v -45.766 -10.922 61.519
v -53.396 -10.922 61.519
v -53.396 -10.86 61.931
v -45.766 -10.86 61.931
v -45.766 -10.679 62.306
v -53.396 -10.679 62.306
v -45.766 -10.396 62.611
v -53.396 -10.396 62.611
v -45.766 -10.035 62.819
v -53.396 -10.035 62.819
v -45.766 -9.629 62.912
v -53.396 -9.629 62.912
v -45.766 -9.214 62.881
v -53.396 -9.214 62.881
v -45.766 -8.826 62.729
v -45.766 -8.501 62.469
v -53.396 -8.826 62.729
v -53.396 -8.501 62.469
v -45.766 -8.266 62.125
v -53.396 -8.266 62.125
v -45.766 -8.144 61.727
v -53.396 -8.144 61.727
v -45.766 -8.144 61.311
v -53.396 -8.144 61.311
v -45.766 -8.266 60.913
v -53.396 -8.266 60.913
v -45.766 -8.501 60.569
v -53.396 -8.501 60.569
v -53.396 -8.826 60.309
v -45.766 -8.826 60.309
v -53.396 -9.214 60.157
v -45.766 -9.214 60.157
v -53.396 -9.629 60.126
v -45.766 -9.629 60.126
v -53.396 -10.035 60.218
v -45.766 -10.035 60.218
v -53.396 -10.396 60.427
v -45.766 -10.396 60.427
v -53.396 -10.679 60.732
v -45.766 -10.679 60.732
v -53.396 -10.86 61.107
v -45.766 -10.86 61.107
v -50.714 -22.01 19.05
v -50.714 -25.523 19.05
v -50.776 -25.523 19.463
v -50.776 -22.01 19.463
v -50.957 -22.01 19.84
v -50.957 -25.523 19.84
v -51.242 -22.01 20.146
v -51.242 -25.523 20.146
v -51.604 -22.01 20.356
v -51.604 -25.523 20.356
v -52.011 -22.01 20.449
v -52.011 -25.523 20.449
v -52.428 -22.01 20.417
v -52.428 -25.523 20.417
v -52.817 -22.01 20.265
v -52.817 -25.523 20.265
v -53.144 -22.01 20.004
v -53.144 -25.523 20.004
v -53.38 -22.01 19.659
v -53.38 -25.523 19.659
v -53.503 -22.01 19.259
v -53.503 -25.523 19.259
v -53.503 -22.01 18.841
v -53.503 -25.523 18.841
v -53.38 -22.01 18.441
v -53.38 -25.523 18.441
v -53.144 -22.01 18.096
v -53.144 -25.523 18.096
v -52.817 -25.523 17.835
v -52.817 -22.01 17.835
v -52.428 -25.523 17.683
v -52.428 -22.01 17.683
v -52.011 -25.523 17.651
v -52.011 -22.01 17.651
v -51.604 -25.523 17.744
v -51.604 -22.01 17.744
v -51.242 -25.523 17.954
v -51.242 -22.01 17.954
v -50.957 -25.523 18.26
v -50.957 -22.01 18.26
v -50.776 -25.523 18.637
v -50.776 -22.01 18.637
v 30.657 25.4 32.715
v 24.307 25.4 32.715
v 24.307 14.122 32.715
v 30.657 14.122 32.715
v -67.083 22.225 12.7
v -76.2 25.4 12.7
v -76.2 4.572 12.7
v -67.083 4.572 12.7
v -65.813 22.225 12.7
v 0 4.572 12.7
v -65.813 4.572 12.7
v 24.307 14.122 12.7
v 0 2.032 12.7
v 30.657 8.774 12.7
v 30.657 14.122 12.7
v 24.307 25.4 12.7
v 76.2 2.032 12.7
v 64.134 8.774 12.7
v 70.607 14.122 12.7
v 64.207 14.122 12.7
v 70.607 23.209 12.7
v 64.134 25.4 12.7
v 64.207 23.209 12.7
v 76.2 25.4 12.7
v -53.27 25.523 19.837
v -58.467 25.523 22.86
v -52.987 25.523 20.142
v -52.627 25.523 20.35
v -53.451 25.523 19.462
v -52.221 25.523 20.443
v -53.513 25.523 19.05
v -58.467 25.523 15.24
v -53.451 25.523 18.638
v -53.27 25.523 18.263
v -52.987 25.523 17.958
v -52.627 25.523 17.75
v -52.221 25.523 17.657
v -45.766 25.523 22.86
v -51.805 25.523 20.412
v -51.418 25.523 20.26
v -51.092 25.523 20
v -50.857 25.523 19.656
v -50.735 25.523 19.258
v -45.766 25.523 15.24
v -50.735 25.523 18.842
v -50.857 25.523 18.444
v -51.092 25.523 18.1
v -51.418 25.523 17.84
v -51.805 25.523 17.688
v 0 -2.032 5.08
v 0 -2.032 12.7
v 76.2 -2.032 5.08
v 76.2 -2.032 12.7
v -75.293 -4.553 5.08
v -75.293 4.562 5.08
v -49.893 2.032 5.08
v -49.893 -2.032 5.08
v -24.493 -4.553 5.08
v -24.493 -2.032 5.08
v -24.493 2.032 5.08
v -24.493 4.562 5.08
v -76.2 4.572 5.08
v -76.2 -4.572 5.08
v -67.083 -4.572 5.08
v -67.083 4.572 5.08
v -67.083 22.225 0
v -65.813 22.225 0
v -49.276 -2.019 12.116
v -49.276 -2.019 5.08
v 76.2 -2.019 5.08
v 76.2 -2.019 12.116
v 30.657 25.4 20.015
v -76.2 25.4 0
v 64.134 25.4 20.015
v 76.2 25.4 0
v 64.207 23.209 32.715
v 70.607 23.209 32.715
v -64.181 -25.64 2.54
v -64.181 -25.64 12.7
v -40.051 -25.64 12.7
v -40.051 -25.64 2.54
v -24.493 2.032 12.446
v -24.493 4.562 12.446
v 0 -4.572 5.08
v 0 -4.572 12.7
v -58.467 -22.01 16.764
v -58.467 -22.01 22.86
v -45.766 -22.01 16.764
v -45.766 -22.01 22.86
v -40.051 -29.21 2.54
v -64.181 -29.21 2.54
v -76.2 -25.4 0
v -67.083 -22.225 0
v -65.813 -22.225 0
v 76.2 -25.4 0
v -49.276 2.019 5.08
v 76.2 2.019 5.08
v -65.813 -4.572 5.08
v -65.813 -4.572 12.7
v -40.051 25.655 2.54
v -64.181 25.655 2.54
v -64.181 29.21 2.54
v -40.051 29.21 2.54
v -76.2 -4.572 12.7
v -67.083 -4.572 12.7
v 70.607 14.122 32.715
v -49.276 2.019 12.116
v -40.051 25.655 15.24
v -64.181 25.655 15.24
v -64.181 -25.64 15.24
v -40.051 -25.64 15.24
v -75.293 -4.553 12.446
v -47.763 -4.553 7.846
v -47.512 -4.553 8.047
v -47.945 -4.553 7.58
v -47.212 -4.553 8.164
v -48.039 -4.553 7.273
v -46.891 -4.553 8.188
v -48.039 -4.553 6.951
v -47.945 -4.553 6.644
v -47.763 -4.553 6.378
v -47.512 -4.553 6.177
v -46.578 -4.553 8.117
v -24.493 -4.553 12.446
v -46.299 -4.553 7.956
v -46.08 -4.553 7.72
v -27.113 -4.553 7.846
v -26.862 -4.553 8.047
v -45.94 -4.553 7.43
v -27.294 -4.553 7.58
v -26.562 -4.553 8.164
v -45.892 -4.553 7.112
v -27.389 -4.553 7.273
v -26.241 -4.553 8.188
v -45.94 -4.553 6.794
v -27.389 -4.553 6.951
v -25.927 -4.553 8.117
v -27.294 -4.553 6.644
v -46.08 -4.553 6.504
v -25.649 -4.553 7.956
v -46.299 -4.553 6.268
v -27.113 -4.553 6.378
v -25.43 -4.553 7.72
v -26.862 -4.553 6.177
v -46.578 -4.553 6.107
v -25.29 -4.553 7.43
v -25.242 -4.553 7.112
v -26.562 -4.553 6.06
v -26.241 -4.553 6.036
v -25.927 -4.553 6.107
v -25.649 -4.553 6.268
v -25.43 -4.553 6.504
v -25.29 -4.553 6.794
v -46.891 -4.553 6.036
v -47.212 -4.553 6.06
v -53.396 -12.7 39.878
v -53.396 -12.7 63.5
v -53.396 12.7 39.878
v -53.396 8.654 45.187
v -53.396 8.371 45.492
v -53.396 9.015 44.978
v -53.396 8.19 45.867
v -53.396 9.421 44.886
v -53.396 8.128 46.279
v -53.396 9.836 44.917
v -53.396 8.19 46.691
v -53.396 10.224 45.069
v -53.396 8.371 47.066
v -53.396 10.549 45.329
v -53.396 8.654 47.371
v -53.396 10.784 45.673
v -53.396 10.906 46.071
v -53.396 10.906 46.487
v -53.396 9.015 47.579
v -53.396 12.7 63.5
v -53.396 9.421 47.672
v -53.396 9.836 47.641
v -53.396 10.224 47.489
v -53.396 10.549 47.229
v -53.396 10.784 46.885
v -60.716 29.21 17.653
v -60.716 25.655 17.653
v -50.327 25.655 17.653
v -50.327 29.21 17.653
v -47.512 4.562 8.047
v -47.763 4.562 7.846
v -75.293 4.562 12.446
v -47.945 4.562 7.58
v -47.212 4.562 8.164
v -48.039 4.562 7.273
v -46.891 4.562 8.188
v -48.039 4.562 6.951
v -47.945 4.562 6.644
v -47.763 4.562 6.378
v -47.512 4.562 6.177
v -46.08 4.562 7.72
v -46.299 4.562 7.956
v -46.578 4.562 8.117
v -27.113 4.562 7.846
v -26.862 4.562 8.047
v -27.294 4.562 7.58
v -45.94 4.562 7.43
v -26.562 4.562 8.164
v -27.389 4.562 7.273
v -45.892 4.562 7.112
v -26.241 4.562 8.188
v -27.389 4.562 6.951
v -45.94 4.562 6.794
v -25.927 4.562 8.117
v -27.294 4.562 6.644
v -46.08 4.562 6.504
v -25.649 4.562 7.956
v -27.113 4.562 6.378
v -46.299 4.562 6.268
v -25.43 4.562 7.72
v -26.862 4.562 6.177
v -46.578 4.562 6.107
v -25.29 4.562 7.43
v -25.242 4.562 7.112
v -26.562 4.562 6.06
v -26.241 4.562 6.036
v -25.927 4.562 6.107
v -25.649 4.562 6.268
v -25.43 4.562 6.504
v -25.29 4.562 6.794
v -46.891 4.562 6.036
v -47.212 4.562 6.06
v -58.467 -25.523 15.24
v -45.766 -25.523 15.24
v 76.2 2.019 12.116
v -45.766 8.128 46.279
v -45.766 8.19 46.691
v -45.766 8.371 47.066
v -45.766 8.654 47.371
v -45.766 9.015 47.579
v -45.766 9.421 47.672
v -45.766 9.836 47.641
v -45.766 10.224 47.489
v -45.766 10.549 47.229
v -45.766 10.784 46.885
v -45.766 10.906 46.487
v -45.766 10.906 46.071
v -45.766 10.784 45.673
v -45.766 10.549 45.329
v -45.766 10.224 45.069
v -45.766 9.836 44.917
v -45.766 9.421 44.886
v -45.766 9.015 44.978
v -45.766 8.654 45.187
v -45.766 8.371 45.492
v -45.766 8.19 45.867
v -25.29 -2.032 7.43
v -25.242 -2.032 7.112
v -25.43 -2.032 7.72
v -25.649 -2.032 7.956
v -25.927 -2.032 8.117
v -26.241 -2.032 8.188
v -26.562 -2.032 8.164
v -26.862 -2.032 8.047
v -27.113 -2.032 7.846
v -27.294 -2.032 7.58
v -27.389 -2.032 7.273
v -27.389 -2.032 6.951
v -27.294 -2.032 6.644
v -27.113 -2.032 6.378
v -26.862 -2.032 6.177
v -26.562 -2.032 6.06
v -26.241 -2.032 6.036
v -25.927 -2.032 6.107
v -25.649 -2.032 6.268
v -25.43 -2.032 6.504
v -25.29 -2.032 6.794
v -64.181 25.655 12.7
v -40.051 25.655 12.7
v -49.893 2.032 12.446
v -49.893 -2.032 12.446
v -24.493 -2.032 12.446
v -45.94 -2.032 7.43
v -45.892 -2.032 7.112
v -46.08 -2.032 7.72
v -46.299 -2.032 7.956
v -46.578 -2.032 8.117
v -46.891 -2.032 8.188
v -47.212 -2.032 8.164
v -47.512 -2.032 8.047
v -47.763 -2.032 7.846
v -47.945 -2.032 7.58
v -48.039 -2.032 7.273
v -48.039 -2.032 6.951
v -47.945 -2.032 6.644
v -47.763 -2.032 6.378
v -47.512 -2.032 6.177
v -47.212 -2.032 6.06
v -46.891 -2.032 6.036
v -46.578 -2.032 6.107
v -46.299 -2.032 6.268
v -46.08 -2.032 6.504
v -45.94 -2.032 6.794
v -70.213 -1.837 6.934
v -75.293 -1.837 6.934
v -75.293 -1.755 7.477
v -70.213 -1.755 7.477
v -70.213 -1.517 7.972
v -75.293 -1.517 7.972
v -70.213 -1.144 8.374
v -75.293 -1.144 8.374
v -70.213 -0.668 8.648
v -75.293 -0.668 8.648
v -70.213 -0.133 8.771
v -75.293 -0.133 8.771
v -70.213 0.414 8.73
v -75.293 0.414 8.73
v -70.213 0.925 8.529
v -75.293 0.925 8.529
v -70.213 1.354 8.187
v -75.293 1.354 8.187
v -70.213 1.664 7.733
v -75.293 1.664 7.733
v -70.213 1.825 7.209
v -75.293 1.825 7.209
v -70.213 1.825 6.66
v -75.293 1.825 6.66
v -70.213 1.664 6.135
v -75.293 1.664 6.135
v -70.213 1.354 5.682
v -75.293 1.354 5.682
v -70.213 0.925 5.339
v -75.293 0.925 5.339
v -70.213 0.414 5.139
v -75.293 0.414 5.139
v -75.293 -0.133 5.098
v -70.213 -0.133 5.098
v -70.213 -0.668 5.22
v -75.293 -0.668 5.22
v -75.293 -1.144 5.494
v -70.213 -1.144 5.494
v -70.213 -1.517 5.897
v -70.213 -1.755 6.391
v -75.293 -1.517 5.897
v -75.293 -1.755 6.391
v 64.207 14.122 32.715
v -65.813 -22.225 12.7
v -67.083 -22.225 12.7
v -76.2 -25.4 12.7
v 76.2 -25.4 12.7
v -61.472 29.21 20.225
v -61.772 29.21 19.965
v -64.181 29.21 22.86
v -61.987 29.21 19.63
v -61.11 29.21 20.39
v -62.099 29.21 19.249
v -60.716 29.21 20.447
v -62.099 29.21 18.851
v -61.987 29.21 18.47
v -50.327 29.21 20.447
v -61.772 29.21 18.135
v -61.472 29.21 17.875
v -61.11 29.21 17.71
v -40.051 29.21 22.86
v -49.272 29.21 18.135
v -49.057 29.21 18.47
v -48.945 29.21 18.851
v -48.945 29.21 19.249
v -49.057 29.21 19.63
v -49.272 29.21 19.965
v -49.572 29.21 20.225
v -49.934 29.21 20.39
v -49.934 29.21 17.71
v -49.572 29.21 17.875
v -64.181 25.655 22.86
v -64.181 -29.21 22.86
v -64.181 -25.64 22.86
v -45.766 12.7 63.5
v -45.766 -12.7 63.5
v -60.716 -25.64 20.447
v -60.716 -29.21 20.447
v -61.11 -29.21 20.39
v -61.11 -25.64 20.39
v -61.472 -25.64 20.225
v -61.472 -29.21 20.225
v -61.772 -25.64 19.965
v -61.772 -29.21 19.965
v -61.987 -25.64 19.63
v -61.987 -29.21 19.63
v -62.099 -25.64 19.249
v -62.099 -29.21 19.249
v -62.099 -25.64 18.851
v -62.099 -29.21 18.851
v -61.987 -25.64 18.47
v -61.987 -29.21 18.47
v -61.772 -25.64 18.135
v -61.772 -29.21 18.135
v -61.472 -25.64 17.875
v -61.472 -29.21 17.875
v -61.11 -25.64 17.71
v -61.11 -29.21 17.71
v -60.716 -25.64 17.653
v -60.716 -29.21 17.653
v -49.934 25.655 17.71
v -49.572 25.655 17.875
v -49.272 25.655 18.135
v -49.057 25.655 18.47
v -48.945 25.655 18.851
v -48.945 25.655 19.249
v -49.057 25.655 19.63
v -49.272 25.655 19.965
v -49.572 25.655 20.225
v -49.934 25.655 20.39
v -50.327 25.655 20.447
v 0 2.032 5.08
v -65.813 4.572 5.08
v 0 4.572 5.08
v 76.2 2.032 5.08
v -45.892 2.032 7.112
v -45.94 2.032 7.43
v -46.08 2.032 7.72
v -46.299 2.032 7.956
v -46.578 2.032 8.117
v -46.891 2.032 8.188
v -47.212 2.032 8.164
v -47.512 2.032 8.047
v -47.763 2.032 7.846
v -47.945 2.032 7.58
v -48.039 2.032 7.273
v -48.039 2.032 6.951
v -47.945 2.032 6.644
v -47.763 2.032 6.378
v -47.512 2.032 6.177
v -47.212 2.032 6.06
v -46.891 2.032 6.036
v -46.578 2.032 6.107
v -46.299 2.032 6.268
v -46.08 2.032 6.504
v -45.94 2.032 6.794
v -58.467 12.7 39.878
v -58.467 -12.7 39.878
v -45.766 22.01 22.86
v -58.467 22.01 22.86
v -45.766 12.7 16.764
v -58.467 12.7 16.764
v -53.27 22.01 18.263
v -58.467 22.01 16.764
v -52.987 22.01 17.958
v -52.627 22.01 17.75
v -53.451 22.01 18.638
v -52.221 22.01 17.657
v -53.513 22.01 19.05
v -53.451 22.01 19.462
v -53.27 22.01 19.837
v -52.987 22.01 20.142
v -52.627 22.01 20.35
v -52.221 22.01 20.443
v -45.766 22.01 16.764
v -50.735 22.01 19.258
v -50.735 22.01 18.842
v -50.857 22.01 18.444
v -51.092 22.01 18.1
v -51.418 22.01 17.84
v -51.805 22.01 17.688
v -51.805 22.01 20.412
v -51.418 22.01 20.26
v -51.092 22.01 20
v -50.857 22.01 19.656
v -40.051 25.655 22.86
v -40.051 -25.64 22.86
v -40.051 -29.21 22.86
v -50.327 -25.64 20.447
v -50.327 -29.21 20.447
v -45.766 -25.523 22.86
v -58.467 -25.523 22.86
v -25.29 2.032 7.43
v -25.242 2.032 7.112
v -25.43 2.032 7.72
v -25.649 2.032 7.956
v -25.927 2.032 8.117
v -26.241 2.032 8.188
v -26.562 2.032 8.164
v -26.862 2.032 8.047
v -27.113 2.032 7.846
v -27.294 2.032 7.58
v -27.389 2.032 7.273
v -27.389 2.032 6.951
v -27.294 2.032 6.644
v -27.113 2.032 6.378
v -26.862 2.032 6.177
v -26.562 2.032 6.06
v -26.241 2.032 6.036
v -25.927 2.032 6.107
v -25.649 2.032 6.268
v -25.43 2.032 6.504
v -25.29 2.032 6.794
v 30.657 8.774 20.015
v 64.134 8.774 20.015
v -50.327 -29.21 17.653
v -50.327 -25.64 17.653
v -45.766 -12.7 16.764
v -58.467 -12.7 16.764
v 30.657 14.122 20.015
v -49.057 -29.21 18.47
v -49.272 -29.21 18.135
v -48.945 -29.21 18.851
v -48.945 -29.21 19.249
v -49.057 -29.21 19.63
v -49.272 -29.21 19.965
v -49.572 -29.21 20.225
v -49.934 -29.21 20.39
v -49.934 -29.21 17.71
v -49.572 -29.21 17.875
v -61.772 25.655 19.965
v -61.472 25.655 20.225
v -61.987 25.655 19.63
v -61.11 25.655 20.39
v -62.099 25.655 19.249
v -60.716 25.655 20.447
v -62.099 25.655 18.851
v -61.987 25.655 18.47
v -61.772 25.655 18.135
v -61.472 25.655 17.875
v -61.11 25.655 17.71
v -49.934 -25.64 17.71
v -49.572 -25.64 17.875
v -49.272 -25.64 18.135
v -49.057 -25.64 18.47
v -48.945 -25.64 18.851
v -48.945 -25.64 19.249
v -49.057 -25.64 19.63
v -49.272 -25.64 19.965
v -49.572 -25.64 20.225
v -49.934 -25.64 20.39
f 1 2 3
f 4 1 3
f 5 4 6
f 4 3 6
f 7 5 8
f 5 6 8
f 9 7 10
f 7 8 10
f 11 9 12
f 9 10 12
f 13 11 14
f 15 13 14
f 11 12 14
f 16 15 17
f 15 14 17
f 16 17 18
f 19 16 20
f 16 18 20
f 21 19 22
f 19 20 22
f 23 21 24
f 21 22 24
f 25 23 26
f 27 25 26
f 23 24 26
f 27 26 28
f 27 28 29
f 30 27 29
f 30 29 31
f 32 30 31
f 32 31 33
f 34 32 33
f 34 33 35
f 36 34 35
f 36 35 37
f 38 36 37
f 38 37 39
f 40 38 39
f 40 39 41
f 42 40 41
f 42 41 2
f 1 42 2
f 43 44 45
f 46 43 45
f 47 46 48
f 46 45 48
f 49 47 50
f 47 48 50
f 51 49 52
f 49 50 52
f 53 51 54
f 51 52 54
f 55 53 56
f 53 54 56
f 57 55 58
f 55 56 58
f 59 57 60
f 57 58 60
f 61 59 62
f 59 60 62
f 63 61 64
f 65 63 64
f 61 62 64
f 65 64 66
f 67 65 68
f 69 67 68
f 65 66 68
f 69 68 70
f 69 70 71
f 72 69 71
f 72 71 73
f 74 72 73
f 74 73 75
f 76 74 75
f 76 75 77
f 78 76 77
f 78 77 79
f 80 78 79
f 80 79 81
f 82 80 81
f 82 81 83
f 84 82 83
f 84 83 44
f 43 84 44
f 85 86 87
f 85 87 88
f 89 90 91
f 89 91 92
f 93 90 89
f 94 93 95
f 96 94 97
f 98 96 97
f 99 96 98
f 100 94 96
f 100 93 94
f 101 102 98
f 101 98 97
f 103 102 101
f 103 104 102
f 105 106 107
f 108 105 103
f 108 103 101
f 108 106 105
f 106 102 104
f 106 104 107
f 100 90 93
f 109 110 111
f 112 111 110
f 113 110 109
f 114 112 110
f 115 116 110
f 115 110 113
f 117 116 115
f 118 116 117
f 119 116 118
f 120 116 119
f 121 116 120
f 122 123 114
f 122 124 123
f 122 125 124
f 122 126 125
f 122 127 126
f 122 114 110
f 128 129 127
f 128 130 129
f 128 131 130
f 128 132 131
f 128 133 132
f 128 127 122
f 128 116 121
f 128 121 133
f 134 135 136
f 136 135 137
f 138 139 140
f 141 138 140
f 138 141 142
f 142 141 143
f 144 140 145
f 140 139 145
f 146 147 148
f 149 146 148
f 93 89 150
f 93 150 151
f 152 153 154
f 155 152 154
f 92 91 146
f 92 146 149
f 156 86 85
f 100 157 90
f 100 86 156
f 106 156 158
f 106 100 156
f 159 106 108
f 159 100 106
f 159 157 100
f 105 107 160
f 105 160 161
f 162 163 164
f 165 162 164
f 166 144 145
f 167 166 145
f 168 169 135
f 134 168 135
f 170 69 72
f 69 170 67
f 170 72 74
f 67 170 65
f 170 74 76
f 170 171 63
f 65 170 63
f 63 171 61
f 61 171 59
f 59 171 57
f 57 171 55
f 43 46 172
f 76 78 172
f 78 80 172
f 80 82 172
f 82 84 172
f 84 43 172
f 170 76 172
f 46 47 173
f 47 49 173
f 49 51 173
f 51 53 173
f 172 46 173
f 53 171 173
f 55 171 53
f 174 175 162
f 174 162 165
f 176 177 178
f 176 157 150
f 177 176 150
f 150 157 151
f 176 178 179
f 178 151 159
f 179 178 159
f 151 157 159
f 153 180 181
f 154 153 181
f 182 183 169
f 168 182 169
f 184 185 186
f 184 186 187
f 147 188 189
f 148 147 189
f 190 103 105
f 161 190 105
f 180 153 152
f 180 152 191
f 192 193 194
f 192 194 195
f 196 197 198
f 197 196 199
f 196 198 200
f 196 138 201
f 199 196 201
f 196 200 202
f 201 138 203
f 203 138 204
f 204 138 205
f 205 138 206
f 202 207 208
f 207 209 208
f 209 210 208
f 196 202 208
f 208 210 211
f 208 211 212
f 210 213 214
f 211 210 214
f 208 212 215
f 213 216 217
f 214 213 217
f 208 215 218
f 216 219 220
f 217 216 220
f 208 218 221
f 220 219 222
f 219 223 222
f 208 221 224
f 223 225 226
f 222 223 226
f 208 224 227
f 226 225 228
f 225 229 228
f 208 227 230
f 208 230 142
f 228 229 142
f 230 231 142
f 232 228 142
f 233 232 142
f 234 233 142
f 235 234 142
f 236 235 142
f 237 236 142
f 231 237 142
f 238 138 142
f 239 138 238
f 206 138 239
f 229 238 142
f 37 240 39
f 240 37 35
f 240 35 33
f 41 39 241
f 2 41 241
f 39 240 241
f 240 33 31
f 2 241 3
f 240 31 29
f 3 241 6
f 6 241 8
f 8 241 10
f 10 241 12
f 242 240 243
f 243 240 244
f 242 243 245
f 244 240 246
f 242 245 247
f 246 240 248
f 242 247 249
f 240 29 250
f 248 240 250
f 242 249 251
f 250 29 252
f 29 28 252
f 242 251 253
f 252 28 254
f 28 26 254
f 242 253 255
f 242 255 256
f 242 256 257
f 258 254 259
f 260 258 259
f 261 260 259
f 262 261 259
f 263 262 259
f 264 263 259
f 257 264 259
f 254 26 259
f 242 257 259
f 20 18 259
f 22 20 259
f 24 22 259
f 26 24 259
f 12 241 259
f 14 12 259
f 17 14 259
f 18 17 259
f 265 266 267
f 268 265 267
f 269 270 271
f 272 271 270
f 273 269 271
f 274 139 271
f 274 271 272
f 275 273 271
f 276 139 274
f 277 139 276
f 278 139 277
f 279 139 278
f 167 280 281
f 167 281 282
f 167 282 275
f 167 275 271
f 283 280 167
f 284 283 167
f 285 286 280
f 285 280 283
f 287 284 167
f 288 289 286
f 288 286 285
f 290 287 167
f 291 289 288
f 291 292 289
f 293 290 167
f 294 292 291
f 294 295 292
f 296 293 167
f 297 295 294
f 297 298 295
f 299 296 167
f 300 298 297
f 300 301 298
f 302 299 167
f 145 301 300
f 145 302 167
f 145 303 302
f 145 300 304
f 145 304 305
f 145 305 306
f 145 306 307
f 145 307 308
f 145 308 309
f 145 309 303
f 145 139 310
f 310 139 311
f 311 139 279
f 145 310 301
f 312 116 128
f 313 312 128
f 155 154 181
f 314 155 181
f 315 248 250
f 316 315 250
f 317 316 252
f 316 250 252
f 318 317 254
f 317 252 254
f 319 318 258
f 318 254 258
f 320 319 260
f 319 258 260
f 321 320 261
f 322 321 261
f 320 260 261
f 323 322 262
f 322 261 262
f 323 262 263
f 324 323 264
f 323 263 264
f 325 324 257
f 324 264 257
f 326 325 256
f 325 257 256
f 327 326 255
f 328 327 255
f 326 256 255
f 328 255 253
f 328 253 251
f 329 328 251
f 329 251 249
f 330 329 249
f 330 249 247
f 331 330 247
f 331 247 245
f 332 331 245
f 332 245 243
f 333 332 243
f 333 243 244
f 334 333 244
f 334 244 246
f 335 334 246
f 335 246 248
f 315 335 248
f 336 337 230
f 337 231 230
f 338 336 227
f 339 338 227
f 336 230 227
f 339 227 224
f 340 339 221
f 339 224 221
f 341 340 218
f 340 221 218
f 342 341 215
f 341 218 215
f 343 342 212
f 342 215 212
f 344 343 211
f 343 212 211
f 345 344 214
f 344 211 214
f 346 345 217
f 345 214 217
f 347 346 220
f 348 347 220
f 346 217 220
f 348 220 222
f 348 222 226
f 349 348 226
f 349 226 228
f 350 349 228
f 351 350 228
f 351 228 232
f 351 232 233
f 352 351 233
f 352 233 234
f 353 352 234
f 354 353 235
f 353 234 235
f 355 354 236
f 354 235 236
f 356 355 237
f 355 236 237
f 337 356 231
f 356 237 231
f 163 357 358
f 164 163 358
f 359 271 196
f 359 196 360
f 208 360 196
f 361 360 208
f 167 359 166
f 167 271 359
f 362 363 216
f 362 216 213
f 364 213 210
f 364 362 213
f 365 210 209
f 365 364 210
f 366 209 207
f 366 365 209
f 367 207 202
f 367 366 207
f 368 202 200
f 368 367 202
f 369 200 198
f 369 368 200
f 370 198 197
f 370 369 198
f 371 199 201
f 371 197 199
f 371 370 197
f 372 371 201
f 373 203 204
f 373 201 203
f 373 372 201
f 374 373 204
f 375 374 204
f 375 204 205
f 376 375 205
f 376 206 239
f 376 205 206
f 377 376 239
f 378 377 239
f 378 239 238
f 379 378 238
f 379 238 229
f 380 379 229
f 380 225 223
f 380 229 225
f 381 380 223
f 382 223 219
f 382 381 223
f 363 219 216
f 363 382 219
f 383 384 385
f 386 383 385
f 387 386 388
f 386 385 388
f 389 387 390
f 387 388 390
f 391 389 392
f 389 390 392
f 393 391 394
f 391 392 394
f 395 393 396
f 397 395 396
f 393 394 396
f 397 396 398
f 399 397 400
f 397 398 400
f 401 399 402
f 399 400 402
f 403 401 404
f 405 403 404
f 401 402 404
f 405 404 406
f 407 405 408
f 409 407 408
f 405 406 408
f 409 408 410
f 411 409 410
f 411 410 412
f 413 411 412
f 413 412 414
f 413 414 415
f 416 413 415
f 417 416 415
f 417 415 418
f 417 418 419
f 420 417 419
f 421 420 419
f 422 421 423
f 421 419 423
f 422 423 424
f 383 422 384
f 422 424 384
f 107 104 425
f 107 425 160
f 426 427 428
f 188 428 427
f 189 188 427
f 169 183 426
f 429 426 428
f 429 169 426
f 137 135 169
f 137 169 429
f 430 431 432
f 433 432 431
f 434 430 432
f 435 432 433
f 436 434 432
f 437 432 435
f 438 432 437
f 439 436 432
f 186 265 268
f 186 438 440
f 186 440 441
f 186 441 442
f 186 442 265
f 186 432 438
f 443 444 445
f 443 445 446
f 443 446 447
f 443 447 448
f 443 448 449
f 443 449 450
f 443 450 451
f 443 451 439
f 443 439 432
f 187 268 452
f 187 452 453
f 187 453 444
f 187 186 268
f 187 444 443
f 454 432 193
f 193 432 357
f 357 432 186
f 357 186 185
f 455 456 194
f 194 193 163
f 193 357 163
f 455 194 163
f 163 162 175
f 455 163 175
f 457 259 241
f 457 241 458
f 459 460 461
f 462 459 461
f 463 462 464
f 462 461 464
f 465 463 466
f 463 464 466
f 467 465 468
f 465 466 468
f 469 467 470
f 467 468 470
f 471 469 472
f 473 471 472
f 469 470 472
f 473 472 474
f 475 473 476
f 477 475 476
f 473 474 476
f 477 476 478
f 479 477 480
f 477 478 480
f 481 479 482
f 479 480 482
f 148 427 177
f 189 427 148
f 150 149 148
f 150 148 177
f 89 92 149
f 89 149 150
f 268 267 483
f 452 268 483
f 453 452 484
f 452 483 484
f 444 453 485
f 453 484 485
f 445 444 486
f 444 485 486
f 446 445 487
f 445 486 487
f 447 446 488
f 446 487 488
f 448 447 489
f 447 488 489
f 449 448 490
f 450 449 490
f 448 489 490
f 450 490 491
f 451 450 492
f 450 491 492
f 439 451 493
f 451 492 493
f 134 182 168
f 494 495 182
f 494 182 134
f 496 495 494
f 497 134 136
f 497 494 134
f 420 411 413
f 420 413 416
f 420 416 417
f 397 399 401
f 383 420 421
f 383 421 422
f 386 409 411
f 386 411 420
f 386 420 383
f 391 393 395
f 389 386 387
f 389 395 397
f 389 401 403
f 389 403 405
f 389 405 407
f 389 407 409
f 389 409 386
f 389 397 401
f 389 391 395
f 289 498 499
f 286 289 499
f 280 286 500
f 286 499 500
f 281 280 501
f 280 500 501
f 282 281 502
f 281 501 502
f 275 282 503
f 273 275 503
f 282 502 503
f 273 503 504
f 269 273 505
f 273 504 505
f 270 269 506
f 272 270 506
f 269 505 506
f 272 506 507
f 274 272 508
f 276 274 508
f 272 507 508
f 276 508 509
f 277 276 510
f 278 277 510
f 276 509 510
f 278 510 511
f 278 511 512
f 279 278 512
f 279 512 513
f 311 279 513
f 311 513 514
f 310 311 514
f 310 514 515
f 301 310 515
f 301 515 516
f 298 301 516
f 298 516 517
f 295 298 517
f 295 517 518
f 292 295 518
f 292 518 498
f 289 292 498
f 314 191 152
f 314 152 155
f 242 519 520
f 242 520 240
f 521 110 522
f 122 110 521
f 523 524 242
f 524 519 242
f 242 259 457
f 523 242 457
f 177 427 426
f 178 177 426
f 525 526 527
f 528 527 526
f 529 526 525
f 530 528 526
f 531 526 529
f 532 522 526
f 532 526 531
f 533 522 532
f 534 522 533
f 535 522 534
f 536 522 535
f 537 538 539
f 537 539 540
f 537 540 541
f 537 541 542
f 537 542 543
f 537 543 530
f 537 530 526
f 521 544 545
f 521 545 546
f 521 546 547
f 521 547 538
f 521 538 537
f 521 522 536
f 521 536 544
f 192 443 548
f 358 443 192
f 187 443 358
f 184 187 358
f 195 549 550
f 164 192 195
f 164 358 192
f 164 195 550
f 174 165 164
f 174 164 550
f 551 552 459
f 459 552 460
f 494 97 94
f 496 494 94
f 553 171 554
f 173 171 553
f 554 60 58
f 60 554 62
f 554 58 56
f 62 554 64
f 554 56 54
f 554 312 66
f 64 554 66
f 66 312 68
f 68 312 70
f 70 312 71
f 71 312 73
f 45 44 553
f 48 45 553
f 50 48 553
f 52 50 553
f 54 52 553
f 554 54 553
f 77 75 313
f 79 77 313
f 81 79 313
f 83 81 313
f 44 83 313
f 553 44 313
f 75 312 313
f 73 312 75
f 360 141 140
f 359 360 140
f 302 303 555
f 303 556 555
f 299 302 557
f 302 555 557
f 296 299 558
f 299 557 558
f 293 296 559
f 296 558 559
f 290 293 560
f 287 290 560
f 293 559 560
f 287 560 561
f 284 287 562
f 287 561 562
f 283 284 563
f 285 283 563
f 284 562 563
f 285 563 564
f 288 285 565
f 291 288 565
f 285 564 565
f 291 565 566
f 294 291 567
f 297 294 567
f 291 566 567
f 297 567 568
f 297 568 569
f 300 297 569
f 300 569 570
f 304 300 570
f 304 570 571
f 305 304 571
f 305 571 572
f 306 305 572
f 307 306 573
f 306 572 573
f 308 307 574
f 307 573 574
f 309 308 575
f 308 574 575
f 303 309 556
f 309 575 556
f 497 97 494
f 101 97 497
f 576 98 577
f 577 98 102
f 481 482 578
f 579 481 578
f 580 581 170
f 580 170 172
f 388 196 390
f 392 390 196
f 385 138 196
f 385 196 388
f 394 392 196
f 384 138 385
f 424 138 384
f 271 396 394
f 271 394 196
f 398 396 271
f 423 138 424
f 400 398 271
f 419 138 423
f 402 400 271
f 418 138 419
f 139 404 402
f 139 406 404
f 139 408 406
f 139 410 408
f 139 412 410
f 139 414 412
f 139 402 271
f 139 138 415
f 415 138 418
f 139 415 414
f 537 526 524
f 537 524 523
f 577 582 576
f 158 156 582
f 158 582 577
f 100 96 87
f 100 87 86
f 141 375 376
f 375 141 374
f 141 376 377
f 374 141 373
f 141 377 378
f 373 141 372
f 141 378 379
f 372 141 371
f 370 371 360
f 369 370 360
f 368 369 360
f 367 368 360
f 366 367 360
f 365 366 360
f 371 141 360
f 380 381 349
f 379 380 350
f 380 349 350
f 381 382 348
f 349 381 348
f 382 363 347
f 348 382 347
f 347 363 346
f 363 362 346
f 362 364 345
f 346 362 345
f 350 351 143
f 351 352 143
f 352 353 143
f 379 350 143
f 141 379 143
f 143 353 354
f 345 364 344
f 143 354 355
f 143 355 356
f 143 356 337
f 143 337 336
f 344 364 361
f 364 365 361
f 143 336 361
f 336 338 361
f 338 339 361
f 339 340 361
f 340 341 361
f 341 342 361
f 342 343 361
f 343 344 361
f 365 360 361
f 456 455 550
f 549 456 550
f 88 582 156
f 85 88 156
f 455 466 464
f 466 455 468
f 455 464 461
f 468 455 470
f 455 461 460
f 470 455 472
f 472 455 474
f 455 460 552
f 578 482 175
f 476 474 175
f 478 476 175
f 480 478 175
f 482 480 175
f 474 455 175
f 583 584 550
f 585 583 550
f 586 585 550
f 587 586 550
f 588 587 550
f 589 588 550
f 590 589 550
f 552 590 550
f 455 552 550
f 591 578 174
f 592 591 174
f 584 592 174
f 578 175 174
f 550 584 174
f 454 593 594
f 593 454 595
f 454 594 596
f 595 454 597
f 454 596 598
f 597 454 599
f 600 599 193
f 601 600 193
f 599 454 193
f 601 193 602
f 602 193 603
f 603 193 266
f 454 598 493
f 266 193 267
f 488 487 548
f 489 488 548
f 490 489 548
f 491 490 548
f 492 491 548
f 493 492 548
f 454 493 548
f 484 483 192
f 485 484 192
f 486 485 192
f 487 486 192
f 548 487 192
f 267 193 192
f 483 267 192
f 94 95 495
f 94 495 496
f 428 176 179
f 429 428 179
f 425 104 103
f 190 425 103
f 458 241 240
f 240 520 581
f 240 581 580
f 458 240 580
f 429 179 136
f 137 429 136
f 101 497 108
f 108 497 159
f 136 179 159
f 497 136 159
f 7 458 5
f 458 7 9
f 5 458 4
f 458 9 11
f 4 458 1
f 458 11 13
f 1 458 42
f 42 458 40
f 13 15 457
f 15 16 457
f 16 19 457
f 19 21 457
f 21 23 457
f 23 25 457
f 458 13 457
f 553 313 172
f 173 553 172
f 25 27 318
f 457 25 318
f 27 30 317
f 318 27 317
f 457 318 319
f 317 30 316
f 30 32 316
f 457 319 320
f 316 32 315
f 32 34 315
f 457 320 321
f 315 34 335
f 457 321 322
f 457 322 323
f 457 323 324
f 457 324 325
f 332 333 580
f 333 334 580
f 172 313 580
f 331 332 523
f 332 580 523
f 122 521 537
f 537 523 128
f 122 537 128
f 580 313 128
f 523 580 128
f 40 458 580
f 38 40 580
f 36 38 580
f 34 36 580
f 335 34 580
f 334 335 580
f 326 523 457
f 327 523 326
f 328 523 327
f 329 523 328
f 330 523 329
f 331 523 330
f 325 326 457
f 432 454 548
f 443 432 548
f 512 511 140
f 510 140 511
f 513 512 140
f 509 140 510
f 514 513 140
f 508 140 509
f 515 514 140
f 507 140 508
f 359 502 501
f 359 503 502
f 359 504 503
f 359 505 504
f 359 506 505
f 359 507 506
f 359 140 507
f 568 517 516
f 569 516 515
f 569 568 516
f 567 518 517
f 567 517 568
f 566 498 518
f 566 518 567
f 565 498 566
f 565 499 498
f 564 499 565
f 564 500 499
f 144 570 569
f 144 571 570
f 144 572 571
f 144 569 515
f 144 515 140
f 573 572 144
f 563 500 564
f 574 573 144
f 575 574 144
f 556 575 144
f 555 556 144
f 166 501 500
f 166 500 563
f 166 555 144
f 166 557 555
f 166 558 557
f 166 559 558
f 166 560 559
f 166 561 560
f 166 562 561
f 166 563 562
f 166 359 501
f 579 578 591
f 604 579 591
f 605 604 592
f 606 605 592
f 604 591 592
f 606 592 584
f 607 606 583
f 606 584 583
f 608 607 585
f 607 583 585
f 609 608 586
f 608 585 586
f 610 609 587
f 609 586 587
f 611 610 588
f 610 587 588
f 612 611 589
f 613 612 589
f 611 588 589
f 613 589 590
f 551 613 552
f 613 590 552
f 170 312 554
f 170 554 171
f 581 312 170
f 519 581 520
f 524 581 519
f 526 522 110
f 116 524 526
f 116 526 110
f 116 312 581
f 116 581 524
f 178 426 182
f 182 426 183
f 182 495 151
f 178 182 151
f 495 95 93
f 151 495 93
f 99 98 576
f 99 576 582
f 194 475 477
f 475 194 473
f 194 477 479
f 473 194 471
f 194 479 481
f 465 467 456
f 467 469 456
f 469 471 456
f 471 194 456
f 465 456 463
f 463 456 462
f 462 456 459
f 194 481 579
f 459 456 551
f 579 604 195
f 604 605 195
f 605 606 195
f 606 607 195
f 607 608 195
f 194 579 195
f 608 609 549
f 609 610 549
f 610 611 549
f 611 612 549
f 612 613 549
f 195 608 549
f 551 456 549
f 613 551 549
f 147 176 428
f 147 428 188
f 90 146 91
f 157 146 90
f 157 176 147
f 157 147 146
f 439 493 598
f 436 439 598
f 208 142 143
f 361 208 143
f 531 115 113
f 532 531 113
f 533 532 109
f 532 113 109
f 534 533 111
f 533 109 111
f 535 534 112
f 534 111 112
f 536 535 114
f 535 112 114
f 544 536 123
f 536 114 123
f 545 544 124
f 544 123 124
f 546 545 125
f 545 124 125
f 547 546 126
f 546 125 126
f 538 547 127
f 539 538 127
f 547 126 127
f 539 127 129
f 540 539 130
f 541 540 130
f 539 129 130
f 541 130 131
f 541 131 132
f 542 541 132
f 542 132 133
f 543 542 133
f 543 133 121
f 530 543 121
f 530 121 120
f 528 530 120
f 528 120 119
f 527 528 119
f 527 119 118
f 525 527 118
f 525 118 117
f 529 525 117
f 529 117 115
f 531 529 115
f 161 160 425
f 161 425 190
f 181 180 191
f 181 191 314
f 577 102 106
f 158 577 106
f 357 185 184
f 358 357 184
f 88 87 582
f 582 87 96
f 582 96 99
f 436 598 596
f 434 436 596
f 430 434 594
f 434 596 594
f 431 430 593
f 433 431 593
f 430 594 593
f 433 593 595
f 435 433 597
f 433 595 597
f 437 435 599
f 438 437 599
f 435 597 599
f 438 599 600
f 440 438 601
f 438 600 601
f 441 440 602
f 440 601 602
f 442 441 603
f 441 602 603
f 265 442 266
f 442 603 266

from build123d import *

# Parameters (mm, degrees)
F0_W      = 152.4
F0_H      = 50.8
F1_DEPTH  = 12.7
F2_W      = 152.4
F2_H      = 4.064
F3_DEPTH  = 7.62
F4_W      = 125.476
F4_H      = 4.0386
F5_DEPTH  = 7.0358
F6_W      = 76.2
F6_H      = 9.144
F7_DEPTH  = 7.62
F8_W      = 50.8
F8_H      = 9.1151185334
F9_DEPTH  = 7.366
F10_W     = 1.27
F10_H     = 44.45
F11_DEPTH = 25.4
F12_W     = 6.35
F12_H     = 11.2776
F12_W_2   = 6.4000114799
F12_H_2   = 9.0863150216
F13_DEPTH = 20.0152
F14_W     = 33.4765905678
F14_H     = 16.6260491401
F15_DEPTH = 7.3152
F16_W     = 25.4
F16_H     = 4.064
F17_DEPTH = 25.4
F18_R     = 1.8415
F19_DEPTH = 5.08
F20_R     = 1.0795
F21_DEPTH = 25.4
F22_W     = 24.13
F22_H     = 58.42
F23_DEPTH = 2.54
F24_W     = 24.13
F24_H     = 3.5704082614
F24_H_2   = 3.5550768292
F25_DEPTH = 10.16
F27_DEPTH = 140.208
F28_W     = 12.7008110285
F28_H     = 51.0461516678
F29_DEPTH = 7.62
F30_W     = 12.7008110285
F30_H     = 44.0202057362
F31_DEPTH = 5.08
F32_W     = 12.7008110285
F32_H     = 25.4
F33_DEPTH = 45.72
F34_R     = 1.397
F35_DEPTH = 25.4
F36_W     = 5.0705485046
F36_H     = 25.4
F37_DEPTH = 23.622
F40_DEPTH = 1.016
F38_R     = 1.4024669373
F41_DEPTH = 8.5598
F39_R     = 1.397
F42_DEPTH = 7.5438


with BuildPart() as f1:
    # F0 (on Top) → F1 (new body)
    with BuildSketch(Plane.XY):
        Rectangle(F0_W, F0_H)
    extrude(amount=F1_DEPTH)

    # F2 (on face) → F3 (cut)
    with BuildSketch(Plane.XY.offset(12.7)):
        Rectangle(F2_W, F2_H)
    extrude(amount=-F3_DEPTH, mode=Mode.SUBTRACT)

    # F6 (on face) → F7 (cut)
    with BuildSketch(Plane.XY.offset(12.7)):
        with Locations((-38.1, 0)):
            Rectangle(F6_W, F6_H)
    extrude(amount=-F7_DEPTH, mode=Mode.SUBTRACT)

    # F10 (on face) → F11 (cut)
    with BuildSketch(Plane.XY.offset(12.7)):
        with Locations((-66.4477199316, 0)):
            Rectangle(F10_W, F10_H)
    extrude(amount=-F11_DEPTH, mode=Mode.SUBTRACT)

    # F12 (on face) → F13 (join)
    with BuildSketch(Plane.XY.offset(12.7)):
        with Locations((27.48235901, 19.7612)):
            Rectangle(F12_W, F12_H)
        with Locations((67.4071349204, 18.6655575108)):
            Rectangle(F12_W_2, F12_H_2)
    extrude(amount=F13_DEPTH)

    # F14 (on face) → F15 (join)
    with BuildSketch(Plane.XY.offset(12.7)):
        with Locations((47.3956542939, 17.08697543)):
            Rectangle(F14_W, F14_H)
    extrude(amount=F15_DEPTH)


with BuildPart() as f5:
    # F4 (on face) → F5 (new body)
    with BuildSketch(Plane.XY.offset(5.08)):
        with Locations((13.4619977325, 0)):
            Rectangle(F4_W, F4_H)
    extrude(amount=F5_DEPTH)


with BuildPart() as f9:
    # F8 (on face) → F9 (new body)
    with BuildSketch(Plane.XY.offset(5.08)):
        with Locations((-49.8929896116, 0.0044535846)):
            Rectangle(F8_W, F8_H)
    extrude(amount=F9_DEPTH)

    # F16 (on face) → F17 (cut)
    with BuildSketch(Plane.XY.offset(12.446)):
        with Locations((-37.1929896116, 0)):
            Rectangle(F16_W, F16_H)
    extrude(amount=-F17_DEPTH, mode=Mode.SUBTRACT)

    # F18 (on face) → F19 (cut)
    with BuildSketch(Plane(origin=(-75.2929896116, 0, 0), x_dir=(0, -1, 0), z_dir=(-1, 0, 0))):
        with Locations((-0.0044535846, 6.9342)):
            Circle(F18_R)
    extrude(amount=-F19_DEPTH, mode=Mode.SUBTRACT)

    # F20 (on face) → F21 (cut, symmetric)
    with BuildSketch(Plane.XZ.offset(-2.032)):
        with Locations((-46.9719896116, 7.112)):
            Circle(F20_R)
        with Locations((-26.3217896116, 7.112)):
            Circle(F20_R)
    extrude(amount=F21_DEPTH, both=True, mode=Mode.SUBTRACT)


with BuildPart() as f23:
    # F22 (on face) → F23 (new body)
    with BuildSketch(Plane.XY.offset(12.7)):
        with Locations((-52.1161258221, 0)):
            Rectangle(F22_W, F22_H)
    extrude(amount=F23_DEPTH)

    # F24 (on face) → F25 (join, symmetric)
    with BuildSketch(Plane(origin=(0, 0, 12.7), x_dir=(1, 0, 0), z_dir=(0, 0, -1))):
        with Locations((-52.1161258221, 27.4247958693)):
            Rectangle(F24_W, F24_H)
        with Locations((-52.1161258221, -27.4324615854)):
            Rectangle(F24_W, F24_H_2)
    extrude(amount=F25_DEPTH, both=True)

    # F26 (on face) → F27 (cut, symmetric)
    with BuildSketch(Plane.XZ.offset(-25.6549231708)):
        with BuildLine():
            ThreePointArc((-60.7163496315, 17.653), (-59.7285214582, 18.0621718267), (-59.3193496315, 19.05))
            ThreePointArc((-59.3193496315, 19.05), (-59.7285214582, 20.0378281733), (-60.7163496315, 20.447))
            Line((-60.7163496315, 20.447), (-60.7163496315, 17.653))
        make_face()
        with BuildLine():
            ThreePointArc((-60.7163496315, 20.447), (-59.7285214582, 20.0378281733), (-59.3193496315, 19.05))
            ThreePointArc((-59.3193496315, 19.05), (-59.7285214582, 18.0621718267), (-60.7163496315, 17.653))
            Line((-60.7163496315, 17.653), (-50.3274984658, 17.653))
            ThreePointArc((-50.3274984658, 17.653), (-51.7244984658, 19.05), (-50.3274984658, 20.447))
            Line((-50.3274984658, 20.447), (-60.7163496315, 20.447))
        make_face()
        with BuildLine():
            Line((-60.7163496315, 17.653), (-60.7163496315, 20.447))
            ThreePointArc((-60.7163496315, 20.447), (-62.1133496315, 19.05), (-60.7163496315, 17.653))
        make_face()
        with BuildLine():
            Line((-50.3274984658, 17.653), (-50.3274984658, 20.447))
            ThreePointArc((-50.3274984658, 20.447), (-51.7244984658, 19.05), (-50.3274984658, 17.653))
        make_face()
        with BuildLine():
            ThreePointArc((-48.9304984658, 19.05), (-49.3396702925, 20.0378281733), (-50.3274984658, 20.447))
            Line((-50.3274984658, 20.447), (-50.3274984658, 17.653))
            ThreePointArc((-50.3274984658, 17.653), (-49.3396702925, 18.0621718267), (-48.9304984658, 19.05))
        make_face()
    extrude(amount=F27_DEPTH, both=True, mode=Mode.SUBTRACT)


with BuildPart() as f29:
    # F28 (on face) → F29 (new body)
    with BuildSketch(Plane.XY.offset(15.24)):
        with Locations((-52.1161258221, 0)):
            Rectangle(F28_W, F28_H)
    extrude(amount=F29_DEPTH)

    # F30 (on face) → F31 (cut)
    with BuildSketch(Plane.XY.offset(22.86)):
        with Locations((-52.1161258221, 0)):
            Rectangle(F30_W, F30_H)
    extrude(amount=-F31_DEPTH, mode=Mode.SUBTRACT)

    # F32 (on face) → F33 (join)
    with BuildSketch(Plane.XY.offset(17.78)):
        with Locations((-52.1161258221, 0)):
            Rectangle(F32_W, F32_H)
    extrude(amount=F33_DEPTH)

    # F34 (on face) → F35 (cut)
    with BuildSketch(Plane(origin=(-58.4665313363, 0, 0), x_dir=(0, -1, 0), z_dir=(-1, 0, 0))):
        with Locations((9.525, 61.5188)):
            Circle(F34_R)
        with Locations((-9.525, 46.2788)):
            Circle(F34_R)
    extrude(amount=-F35_DEPTH, mode=Mode.SUBTRACT)

    # F36 (on face) → F37 (cut)
    with BuildSketch(Plane.XY.offset(63.5)):
        with Locations((-55.931257084, 0)):
            Rectangle(F36_W, F36_H)
    extrude(amount=-F37_DEPTH, mode=Mode.SUBTRACT)

    # F40 (cut): faces of the model
    f40_faces = [f29.faces().sort_by_distance(p)[0] for p in [
        (-52.1161258221, 17.355051434, 17.78),
        (-52.1161258221, -17.355051434, 17.78),
    ]]
    extrude(f40_faces, amount=-F40_DEPTH, mode=Mode.SUBTRACT)

    # F38 (on face) → F41 (cut)
    with BuildSketch(Plane.XZ.offset(25.5230758339)):
        with Locations((-52.1161258221, 19.05)):
            Circle(F38_R)
    extrude(amount=-F41_DEPTH, mode=Mode.SUBTRACT)

    # F39 (on face) → F42 (cut)
    with BuildSketch(Plane(origin=(0, 25.5230758339, 0), x_dir=(-1, 0, 0), z_dir=(0, 1, 0))):
        with Locations((52.1161258221, 19.05)):
            Circle(F39_R)
    extrude(amount=-F42_DEPTH, mode=Mode.SUBTRACT)


solid = Compound([f1.part, f5.part, f9.part, f23.part, f29.part])
